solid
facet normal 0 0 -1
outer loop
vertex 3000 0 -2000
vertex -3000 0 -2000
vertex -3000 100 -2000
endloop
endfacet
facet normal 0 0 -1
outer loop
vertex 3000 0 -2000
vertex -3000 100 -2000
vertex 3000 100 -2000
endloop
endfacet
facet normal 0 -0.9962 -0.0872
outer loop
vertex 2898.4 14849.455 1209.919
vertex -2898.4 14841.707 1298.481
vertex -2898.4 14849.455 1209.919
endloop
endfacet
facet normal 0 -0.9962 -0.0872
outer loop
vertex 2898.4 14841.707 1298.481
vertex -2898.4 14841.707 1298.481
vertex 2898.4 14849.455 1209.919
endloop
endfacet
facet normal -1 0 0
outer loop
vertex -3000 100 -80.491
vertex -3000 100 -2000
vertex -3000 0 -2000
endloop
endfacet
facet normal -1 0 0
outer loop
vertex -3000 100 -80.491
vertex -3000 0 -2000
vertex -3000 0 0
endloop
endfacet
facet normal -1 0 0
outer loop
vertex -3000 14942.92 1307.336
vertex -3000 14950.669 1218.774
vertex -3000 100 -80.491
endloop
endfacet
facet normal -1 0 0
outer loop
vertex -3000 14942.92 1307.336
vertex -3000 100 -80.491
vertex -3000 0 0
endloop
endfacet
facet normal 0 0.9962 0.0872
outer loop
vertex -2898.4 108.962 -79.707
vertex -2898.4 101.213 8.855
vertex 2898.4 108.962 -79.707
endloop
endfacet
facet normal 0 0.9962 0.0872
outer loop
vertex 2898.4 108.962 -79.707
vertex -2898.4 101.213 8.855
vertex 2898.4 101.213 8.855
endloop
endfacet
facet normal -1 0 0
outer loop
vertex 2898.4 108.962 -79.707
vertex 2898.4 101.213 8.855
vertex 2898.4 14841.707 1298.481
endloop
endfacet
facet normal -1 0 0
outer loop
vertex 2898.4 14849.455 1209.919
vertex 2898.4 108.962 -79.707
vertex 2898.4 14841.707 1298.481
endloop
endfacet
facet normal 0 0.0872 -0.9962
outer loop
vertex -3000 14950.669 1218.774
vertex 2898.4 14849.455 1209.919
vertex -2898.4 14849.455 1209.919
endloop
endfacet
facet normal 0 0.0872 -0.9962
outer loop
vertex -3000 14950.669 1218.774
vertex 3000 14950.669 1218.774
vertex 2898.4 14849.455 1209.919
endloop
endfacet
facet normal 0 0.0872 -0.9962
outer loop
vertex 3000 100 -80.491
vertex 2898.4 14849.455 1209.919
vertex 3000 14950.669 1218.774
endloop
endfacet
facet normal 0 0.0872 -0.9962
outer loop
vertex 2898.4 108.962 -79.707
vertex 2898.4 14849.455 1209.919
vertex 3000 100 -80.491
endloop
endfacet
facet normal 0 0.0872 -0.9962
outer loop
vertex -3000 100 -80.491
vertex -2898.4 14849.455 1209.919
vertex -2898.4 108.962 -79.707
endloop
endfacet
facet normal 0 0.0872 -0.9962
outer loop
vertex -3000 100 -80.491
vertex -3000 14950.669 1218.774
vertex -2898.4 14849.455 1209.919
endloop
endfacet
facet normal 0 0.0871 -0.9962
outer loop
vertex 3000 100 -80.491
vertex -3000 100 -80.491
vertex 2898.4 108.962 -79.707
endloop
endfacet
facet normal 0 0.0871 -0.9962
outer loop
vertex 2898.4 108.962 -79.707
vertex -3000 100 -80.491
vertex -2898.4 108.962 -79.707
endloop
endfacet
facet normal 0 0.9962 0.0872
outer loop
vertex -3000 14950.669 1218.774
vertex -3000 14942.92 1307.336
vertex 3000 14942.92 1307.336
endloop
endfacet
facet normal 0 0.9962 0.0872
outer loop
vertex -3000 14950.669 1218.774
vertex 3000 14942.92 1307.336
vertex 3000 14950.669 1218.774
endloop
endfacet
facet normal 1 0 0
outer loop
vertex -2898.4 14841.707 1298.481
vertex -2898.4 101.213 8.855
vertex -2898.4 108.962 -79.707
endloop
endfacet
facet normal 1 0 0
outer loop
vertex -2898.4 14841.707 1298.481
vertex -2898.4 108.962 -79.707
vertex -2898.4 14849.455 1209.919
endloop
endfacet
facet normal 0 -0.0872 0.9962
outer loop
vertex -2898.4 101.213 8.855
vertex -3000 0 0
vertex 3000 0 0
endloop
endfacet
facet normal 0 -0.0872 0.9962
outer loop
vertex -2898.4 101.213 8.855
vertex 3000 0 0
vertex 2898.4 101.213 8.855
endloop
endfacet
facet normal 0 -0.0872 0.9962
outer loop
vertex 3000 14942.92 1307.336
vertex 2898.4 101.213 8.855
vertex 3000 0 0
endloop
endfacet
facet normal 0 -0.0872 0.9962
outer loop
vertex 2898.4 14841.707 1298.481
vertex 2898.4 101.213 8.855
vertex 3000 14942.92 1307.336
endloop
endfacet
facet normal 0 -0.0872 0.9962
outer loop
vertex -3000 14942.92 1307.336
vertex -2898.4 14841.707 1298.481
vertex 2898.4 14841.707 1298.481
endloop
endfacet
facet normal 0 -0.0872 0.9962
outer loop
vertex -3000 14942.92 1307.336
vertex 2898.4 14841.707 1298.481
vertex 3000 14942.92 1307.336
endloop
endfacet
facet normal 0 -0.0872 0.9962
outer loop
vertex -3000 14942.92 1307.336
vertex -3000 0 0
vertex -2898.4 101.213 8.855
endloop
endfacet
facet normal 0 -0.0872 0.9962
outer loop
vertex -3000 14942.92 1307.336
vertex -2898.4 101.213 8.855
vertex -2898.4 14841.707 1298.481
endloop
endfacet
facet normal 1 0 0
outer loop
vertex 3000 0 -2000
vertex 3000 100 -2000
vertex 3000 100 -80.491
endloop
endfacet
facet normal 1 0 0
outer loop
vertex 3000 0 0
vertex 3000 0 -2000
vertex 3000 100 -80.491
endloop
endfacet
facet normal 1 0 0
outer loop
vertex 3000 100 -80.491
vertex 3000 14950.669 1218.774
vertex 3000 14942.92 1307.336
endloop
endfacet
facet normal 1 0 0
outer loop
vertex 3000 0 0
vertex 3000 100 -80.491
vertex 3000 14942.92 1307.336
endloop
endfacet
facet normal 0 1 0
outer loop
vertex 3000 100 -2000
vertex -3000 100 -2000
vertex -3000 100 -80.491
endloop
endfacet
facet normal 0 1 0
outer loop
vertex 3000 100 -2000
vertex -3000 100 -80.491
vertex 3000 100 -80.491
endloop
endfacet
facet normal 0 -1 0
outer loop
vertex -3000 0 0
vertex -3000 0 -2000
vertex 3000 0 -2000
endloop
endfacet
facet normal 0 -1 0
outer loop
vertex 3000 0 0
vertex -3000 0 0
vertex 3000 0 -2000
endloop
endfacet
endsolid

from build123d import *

# Parameters (mm, degrees)
SKETCH2_W                = 6000
SKETCH2_H                = 2000
BOSS_EXTRUDE1_DEPTH      = 100
BOSS_EXTRUDE2_DEPTH      = 3000
BOSS_EXTRUDE2_DEPTH_BACK = 3000
SKETCH4_W                = 5796.8
SKETCH4_H                = 14796.8
CUT_EXTRUDE1_DEPTH       = 15380.28776285


with BuildPart() as part:
    # Sketch2 → Boss-Extrude1 (new body)
    with BuildSketch(Plane(origin=(0, 0, 0), x_dir=(1, 0, 0), z_dir=(0, 1, 0))):
        with Locations((0, 1000)):
            Rectangle(SKETCH2_W, SKETCH2_H)
    extrude(amount=BOSS_EXTRUDE1_DEPTH)

    # Sketch3 → Boss-Extrude2 (add, two sides: drawn at the far end of the back side and taken through both)
    with BuildSketch(Plane(origin=(0, 0, 0), x_dir=(0, 0, -1), z_dir=(1, 0, 0)).offset(-BOSS_EXTRUDE2_DEPTH_BACK)):
        Polygon((0, 0), (-1307.336141215, 14942.920471376), (-1218.774432554, 14950.668616906), (89.239583558, 0), align=None)
    extrude(amount=BOSS_EXTRUDE2_DEPTH + BOSS_EXTRUDE2_DEPTH_BACK)

    # Sketch4 → Cut-Extrude1 (cut, through all)
    with BuildSketch(Plane(origin=(0, 0, 0), x_dir=(1, 0, 0), z_dir=(0, -0.08715574274765157, 0.9961946980917462))):
        with Locations((0, 7500)):
            Rectangle(SKETCH4_W, SKETCH4_H)
    extrude(amount=-CUT_EXTRUDE1_DEPTH, mode=Mode.SUBTRACT)


solid = part.part
